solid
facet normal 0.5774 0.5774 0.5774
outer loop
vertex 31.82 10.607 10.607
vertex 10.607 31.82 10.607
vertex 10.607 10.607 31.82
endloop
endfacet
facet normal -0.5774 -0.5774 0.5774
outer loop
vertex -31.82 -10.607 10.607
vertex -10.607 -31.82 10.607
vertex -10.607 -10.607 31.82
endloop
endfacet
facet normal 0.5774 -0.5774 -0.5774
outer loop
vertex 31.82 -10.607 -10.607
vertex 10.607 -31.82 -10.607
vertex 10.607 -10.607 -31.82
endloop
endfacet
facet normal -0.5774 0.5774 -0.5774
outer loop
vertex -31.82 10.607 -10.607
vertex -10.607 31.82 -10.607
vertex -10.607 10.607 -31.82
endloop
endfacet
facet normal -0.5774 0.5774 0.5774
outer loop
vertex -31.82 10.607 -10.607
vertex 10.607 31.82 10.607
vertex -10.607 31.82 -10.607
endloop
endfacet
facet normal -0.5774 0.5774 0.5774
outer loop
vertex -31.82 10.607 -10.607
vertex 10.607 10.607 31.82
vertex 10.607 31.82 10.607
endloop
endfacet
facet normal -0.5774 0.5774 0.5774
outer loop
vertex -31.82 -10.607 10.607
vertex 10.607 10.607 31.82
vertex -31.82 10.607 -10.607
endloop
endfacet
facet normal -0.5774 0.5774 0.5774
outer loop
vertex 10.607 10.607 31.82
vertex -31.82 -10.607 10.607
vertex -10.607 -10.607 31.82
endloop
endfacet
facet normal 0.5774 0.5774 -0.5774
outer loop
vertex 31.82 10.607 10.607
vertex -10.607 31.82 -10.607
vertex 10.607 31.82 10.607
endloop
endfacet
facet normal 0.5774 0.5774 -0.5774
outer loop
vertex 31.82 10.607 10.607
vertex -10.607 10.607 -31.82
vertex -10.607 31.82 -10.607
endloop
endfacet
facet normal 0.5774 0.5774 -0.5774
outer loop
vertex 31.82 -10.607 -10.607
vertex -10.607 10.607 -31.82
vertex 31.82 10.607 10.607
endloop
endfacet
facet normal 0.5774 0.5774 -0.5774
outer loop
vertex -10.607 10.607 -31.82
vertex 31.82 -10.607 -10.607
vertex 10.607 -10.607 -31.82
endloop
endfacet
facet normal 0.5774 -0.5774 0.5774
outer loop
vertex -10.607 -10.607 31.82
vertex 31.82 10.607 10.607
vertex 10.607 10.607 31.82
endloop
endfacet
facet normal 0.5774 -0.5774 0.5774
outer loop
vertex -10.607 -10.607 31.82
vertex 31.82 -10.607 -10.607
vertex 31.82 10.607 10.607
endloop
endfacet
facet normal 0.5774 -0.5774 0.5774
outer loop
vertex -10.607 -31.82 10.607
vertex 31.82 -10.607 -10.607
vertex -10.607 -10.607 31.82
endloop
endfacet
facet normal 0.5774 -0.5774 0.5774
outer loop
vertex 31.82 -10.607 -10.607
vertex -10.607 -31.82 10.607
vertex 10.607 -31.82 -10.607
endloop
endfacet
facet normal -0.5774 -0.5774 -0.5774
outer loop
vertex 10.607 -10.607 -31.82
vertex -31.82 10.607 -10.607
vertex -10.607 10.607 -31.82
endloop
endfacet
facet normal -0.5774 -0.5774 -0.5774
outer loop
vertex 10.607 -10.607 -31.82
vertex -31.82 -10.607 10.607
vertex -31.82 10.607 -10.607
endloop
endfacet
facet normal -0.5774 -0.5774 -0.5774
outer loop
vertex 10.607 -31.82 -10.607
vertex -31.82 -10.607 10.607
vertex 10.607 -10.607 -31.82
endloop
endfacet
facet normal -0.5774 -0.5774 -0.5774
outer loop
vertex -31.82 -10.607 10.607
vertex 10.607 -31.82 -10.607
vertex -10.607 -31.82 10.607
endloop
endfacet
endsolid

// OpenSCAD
// Truncated Tetrahedron
// (C) @oblomobka - 2023.06
// GPL license

/* **CUSTOMIZER VARIABLES** */
// Edge
edge = 30; //[10:100]
// Center of the solid or stand over a face
position = "Center"; //["Center", "Face"]

/* **MODULES** */   
module TruncatedTetrahedron(edge=20, position="Face"){ //tT -> Conway notation
    
    // Invariants
    diAngleHexHex_tT = acos(1/3);   // dihedral angle between hexagonal faces of tT  = 70.529
    diAngleTriHex_tT = acos(-1/3);  // dihedral angle between hexagonal-triangle faces of tT = 109,471
    
    // Relations
    rInsTruncatedTetrahedron = 3/sqrt(24); // radius of a inscribed sphere touching the hexagons - for edge = 1 -> radius = 0,612
    
    // Variables
    a = 3*edge/(2*sqrt(2));     // Tetrahedron points
    b = edge/sqrt(2);           // Truncate factor
    
    // Definition of points and faces V = 12 / F = 8 ( 4hexagons + 4 triangles )
    tTpoints=[
        // Every line define a triangle face
        [ +(a-b), +(a-b), +a], [ +(a-b), +a, +(a-b)], [ +a, +(a-b), +(a-b)],   // +X +Y +Z
        [ -(a-b), -(a-b), +a], [ -(a-b), -a, +(a-b)], [ -a, -(a-b), +(a-b)],   // -X -Y +Z
        [ +(a-b), -(a-b), -a], [ +(a-b), -a, -(a-b)], [ +a, -(a-b), -(a-b)],   // +X -Y -Z
        [ -(a-b), +(a-b), -a], [ -(a-b), +a, -(a-b)], [ -a, +(a-b), -(a-b)]    // -X +Y -Z              
        ];
    
    tTfaces=[  
        [  0,  1,  2], [  3,  4,  5], [  6,  7,  8], [  9, 10, 11],
        [  0,  3,  5, 11, 10,  1], [  1, 10,  9,  6,  8,  2],
        [  0,  2,  8,  7,  4,  3], [  4,  7,  6,  9, 11,  5]
        ];
 
    // Polyhedron stands on xy plane centered on the center of the face or centered on the center of polyhedron
    if ( position == "Center") {
        polyhedron ( tTpoints, tTfaces);
        }
    else if ( position == "Face"){
        translate ([ 0, 0, edge*rInsTruncatedTetrahedron]) 
            rotate ([ 90-diAngleHexHex_tT/2, 0, 0])
                rotate ([0, 0, 45])
                    polyhedron ( tTpoints, tTfaces);}
    }

/* **RENDERING OF SOLIDS** */
TruncatedTetrahedron ( edge = edge, position = position);
